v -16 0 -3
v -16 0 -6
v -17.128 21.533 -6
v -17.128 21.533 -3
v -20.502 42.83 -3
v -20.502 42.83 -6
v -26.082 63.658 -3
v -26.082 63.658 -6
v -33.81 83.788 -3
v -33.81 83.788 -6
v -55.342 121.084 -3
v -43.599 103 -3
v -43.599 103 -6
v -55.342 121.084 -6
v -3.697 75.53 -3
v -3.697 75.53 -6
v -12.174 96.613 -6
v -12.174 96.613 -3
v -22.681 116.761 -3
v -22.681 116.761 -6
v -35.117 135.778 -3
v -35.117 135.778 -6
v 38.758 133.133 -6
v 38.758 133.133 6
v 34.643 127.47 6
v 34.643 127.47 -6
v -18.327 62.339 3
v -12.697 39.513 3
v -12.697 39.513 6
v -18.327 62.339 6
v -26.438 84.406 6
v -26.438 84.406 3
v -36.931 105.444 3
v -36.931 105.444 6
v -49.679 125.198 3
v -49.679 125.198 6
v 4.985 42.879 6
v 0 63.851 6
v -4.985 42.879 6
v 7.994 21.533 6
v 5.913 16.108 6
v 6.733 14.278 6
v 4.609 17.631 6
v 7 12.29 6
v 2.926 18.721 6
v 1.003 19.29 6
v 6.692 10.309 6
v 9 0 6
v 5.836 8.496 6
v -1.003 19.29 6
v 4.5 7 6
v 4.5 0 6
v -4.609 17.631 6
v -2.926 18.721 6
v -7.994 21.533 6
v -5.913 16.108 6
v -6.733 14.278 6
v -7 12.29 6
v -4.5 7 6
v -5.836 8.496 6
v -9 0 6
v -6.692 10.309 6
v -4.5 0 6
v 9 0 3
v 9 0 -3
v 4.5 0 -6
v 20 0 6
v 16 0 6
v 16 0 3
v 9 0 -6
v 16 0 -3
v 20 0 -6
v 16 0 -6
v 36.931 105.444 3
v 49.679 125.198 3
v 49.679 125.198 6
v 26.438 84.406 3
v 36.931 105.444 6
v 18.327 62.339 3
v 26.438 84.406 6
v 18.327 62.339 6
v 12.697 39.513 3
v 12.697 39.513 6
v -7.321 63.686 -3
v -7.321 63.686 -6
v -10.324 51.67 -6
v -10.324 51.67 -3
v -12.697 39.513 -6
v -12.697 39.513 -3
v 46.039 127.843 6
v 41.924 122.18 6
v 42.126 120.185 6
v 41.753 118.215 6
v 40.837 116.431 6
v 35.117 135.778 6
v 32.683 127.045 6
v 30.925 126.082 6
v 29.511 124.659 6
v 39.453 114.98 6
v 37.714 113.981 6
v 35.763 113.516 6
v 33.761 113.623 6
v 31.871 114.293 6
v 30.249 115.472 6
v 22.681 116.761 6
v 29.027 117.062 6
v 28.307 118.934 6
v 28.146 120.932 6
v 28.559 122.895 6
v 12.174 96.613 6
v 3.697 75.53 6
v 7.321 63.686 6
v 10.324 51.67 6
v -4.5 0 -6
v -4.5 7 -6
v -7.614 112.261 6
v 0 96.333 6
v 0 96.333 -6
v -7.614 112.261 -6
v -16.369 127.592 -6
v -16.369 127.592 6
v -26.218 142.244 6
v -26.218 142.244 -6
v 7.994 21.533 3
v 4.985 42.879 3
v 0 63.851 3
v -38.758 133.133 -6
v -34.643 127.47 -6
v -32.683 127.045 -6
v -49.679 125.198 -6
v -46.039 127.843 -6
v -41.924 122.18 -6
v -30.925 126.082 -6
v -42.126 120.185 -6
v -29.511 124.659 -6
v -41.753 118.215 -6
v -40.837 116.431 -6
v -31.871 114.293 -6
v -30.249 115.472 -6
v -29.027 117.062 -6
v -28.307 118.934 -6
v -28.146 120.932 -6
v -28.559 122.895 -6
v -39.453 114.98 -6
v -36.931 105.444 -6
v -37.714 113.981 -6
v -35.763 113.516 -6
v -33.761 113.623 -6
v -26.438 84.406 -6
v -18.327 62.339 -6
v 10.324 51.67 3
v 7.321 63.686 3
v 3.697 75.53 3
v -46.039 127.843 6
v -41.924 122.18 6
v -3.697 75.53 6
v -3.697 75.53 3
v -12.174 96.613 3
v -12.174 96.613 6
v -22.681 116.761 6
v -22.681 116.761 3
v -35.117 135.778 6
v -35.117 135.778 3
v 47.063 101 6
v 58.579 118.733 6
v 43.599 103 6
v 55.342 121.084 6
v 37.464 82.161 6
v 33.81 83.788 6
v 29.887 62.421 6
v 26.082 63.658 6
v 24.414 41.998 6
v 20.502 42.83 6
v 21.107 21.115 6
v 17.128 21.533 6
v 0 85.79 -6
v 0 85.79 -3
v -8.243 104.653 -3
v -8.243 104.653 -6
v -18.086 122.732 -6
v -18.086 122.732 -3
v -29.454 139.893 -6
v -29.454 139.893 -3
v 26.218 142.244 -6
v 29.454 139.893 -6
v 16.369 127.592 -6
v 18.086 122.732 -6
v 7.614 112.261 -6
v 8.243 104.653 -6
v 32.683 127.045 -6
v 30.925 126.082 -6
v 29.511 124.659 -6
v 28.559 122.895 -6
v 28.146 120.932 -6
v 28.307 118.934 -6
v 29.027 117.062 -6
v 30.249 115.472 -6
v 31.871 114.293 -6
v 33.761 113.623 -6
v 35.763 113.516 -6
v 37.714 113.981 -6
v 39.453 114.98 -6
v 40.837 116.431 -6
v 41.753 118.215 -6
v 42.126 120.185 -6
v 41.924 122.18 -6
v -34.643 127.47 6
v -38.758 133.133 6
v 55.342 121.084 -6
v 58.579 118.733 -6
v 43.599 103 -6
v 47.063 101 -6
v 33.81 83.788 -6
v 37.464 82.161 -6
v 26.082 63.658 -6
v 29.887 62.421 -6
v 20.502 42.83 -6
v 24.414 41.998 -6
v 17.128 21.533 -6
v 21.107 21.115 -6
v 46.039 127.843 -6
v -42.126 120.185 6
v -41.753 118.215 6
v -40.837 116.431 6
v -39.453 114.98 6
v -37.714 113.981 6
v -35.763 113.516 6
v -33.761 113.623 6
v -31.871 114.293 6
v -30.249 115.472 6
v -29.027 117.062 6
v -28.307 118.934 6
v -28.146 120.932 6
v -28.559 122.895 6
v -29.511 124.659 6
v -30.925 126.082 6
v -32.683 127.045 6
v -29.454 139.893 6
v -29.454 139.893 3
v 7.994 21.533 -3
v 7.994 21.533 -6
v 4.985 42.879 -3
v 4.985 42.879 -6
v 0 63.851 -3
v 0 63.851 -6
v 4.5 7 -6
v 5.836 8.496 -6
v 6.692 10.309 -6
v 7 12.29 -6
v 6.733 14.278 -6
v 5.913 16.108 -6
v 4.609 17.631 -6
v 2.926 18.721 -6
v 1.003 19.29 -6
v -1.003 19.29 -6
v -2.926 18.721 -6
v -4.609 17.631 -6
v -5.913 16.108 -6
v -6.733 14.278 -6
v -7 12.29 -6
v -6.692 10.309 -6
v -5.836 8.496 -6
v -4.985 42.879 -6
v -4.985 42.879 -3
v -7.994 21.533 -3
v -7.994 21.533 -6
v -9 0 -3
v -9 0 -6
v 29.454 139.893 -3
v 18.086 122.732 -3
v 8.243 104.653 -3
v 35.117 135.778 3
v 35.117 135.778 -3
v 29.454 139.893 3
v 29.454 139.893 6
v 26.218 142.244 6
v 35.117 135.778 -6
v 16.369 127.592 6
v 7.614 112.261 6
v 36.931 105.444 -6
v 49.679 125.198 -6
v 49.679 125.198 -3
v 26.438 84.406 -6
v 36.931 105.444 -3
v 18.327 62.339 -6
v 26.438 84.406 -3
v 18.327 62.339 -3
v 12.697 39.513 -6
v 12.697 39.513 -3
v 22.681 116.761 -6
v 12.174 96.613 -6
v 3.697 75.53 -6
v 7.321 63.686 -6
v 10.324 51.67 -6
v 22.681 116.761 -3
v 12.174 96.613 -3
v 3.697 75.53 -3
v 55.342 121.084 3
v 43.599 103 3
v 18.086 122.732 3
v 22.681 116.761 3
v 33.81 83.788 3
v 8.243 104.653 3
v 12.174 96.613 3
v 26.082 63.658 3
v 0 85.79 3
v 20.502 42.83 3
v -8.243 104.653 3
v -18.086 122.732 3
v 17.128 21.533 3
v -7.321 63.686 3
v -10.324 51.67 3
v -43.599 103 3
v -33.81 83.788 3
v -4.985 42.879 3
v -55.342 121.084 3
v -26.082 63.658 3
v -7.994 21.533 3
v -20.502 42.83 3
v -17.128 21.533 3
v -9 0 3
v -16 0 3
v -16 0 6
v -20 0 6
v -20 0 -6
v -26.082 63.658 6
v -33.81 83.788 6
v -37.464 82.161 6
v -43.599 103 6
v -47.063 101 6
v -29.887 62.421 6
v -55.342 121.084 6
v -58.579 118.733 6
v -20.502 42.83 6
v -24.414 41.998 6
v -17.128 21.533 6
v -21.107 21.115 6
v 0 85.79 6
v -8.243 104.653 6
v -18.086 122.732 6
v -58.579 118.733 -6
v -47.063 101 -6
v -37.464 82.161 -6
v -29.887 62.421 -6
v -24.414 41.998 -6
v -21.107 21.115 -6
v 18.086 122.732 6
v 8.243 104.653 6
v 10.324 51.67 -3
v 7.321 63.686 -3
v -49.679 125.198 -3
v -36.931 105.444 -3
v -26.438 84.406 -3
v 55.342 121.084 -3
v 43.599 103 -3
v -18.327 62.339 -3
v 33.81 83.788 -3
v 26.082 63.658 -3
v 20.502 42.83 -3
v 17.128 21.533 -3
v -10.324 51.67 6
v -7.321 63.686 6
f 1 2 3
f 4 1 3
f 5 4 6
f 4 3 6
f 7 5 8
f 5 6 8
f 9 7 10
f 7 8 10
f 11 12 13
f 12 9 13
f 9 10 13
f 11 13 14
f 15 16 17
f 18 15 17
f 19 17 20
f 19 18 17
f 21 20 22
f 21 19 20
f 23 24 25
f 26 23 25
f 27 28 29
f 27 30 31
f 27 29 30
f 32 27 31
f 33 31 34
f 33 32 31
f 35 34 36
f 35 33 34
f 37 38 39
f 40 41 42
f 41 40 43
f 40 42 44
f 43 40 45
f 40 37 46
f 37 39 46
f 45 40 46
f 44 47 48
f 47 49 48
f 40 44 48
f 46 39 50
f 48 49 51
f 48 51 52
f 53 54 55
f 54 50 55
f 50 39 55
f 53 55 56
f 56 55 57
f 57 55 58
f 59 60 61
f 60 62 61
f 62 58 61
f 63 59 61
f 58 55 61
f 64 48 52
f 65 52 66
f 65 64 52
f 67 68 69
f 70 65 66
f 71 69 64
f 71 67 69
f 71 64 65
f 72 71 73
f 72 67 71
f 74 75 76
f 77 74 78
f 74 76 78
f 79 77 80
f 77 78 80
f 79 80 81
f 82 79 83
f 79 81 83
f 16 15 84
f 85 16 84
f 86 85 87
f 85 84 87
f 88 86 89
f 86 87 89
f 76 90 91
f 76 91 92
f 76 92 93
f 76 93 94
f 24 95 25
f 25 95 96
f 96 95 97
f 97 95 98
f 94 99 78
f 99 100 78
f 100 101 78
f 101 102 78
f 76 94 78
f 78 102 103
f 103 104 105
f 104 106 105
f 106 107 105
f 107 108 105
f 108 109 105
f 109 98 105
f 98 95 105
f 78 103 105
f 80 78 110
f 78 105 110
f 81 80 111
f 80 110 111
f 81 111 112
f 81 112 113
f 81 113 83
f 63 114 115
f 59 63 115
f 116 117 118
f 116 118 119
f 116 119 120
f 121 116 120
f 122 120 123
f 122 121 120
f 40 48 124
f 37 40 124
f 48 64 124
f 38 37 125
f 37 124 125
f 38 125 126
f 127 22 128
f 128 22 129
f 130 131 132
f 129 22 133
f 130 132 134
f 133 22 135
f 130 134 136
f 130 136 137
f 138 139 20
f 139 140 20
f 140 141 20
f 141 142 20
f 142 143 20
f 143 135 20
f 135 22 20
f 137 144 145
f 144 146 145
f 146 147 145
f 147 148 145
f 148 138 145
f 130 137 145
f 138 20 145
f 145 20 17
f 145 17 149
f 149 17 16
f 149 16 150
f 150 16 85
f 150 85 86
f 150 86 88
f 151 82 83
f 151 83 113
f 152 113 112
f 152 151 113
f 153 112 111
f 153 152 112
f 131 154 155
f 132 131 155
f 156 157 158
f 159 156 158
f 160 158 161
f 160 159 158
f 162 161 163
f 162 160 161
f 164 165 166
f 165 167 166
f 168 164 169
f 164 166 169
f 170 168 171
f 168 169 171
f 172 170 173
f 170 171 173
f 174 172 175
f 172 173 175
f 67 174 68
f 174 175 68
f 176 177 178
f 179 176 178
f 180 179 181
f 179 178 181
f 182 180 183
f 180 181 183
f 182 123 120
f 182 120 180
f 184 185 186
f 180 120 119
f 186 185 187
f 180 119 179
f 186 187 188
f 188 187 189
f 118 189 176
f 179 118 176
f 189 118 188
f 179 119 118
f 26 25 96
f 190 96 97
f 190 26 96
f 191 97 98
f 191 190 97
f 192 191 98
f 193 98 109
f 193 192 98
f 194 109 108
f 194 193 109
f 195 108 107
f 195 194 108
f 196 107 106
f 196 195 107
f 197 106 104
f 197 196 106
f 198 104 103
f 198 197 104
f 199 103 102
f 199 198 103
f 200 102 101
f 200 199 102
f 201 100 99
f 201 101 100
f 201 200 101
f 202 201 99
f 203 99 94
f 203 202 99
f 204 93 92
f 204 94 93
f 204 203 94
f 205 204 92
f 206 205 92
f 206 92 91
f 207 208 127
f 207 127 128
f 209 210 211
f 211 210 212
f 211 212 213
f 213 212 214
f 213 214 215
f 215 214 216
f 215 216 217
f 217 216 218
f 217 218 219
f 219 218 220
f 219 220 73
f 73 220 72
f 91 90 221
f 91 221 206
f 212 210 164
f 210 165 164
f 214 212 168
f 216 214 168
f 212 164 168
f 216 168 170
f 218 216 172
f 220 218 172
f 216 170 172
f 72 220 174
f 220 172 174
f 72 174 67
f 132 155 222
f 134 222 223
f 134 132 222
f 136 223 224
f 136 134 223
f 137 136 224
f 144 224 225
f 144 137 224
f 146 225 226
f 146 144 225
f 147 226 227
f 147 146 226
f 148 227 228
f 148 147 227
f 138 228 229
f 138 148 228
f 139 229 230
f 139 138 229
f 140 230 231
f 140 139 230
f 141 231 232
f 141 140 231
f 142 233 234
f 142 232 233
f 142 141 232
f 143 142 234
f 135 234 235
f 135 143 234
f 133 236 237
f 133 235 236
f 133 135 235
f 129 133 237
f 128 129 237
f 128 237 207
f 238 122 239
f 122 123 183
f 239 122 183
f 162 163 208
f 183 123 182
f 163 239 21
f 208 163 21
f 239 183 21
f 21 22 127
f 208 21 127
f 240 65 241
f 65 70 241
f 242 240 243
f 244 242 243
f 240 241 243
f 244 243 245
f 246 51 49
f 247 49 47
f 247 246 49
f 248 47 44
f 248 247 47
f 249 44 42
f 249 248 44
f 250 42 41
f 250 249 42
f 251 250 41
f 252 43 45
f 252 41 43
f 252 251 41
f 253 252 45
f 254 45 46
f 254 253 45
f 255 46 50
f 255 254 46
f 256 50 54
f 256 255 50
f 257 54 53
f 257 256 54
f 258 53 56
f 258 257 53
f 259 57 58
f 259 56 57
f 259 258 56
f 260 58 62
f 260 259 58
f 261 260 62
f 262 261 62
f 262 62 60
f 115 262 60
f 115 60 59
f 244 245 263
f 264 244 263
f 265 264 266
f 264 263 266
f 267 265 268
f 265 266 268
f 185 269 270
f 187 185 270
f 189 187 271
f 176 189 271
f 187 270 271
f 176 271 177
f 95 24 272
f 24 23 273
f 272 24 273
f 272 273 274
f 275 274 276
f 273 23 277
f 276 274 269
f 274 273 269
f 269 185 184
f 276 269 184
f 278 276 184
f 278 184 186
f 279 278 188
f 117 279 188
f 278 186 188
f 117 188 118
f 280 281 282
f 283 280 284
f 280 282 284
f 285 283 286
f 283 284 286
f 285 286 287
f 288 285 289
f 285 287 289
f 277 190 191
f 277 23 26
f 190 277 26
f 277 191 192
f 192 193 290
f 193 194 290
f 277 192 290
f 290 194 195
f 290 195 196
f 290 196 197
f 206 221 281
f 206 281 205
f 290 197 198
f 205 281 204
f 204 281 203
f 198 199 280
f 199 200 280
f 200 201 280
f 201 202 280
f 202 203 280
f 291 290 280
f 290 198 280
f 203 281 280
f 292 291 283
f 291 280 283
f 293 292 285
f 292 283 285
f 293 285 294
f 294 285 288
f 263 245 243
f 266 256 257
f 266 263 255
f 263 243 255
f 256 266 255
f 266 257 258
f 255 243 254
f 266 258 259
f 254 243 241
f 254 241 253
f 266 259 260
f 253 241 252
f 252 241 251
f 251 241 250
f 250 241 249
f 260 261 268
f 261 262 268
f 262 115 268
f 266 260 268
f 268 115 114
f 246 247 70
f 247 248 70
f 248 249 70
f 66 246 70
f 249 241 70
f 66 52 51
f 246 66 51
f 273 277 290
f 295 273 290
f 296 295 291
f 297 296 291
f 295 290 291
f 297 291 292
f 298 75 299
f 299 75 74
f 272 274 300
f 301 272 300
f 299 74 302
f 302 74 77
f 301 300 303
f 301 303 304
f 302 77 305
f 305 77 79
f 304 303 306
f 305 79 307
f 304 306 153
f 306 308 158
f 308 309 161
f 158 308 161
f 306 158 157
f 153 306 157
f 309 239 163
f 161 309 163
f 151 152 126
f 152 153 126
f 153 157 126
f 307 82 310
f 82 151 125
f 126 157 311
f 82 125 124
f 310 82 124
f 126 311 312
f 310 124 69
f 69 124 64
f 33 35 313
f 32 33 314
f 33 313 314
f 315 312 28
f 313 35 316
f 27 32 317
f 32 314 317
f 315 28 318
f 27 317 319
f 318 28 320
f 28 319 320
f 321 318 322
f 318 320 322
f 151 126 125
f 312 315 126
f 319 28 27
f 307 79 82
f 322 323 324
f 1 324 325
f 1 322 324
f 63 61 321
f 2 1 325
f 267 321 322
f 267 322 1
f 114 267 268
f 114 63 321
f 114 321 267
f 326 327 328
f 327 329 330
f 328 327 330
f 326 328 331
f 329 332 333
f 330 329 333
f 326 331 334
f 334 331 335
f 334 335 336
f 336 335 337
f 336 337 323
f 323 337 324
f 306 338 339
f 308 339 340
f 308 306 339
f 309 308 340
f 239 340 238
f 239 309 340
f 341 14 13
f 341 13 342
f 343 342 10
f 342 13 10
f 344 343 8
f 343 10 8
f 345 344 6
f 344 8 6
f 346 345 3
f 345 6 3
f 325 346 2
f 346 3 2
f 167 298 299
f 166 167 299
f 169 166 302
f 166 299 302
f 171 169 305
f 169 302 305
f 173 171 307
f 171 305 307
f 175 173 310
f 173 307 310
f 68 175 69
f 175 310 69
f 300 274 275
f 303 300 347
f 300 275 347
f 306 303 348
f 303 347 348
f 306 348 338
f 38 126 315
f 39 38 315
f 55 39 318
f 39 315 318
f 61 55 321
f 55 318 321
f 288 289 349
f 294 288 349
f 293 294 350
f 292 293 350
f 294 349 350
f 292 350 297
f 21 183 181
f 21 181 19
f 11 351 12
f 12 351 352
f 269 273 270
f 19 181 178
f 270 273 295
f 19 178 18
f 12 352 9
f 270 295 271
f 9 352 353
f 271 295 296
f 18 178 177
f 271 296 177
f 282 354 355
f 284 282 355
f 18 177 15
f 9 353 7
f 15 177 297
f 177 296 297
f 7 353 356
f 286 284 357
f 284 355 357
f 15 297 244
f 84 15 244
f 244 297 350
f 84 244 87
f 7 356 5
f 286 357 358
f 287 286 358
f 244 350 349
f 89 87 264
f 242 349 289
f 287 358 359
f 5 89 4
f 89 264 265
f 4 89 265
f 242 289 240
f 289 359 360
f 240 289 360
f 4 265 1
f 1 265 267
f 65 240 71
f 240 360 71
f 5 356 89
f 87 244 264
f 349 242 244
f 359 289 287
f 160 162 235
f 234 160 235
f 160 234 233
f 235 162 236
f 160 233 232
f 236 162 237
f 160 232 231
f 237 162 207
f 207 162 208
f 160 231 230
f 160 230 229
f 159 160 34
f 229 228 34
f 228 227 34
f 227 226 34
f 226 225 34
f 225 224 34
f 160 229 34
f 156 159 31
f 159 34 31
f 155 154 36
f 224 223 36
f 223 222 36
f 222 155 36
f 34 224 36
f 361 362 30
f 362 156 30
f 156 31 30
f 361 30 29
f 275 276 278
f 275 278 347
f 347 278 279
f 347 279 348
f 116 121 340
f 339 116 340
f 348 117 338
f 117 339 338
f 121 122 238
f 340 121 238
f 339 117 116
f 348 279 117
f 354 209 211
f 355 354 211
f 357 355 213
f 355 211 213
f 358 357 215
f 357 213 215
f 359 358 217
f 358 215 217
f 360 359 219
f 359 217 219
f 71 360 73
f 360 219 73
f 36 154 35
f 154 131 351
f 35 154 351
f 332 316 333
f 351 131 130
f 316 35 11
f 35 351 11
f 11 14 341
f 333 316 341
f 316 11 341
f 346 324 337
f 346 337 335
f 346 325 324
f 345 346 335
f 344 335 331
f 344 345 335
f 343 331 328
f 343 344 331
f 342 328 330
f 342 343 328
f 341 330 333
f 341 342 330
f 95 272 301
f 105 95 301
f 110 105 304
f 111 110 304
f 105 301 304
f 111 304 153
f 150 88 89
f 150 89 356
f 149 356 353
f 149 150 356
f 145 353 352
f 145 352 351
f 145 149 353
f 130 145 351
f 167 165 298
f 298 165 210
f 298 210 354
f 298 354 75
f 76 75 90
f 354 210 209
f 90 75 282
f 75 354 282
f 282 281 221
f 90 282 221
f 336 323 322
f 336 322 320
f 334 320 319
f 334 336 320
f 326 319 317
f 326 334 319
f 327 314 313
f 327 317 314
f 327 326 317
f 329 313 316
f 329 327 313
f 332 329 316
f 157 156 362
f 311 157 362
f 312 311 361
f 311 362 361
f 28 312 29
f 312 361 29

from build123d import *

# Parameters (mm, degrees)
SKETCH003_W          = 7
SKETCH003_H          = 3
SKETCH004_W          = 7
SKETCH004_H          = 3
SKETCH005_W          = 7
SKETCH005_H          = 3
SKETCH006_W          = 7
SKETCH006_H          = 3
POCKET_DEPTH         = 6.001
POCKET_DEPTH_BACK    = -6.001
POCKET001_DEPTH      = 6.001
POCKET001_DEPTH_BACK = -6.001
POCKET002_DEPTH      = 6.001
POCKET002_DEPTH_BACK = -6.001


with BuildPart() as part:
    # AdditivePipe: sweep along a path in Sketch
    with BuildLine(Plane.XY) as additivepipe_path:
        ThreePointArc((0, 0), (-10.865453, 68.601773), (-42.398227, 130.488326))
    # Sketch002 → AdditivePipe (sweep)
    with BuildSketch(Plane.XZ):
        Polygon((-20, 6), (-20, -6), (-16, -6), (-16, -3), (-9, -3), (-9, -6), (9, -6), (9, -3), (16, -3), (16, -6), (20, -6), (20, 6), (16, 6), (16, 3), (9, 3), (9, 6), (-9, 6), (-9, 3), (-16, 3), (-16, 6), align=None)
    sweep(path=additivepipe_path.line)

    # AdditivePipe001: sweep along a path in Sketch001
    with BuildLine(Plane.XY) as additivepipe001_path:
        ThreePointArc((42.398227, 130.488326), (10.865453, 68.601773), (0, 0))
    # Sketch002 → AdditivePipe001 (sweep)
    with BuildSketch(Plane.XZ):
        Polygon((-20, 6), (-20, -6), (-16, -6), (-16, -3), (-9, -3), (-9, -6), (9, -6), (9, -3), (16, -3), (16, -6), (20, -6), (20, 6), (16, 6), (16, 3), (9, 3), (9, 6), (-9, 6), (-9, 3), (-16, 3), (-16, 6), align=None)
    sweep(path=additivepipe001_path.line)

    # SubtractivePipe: sweep along a path in Sketch
    with BuildLine(Plane.XY) as subtractivepipe_path:
        ThreePointArc((0, 0), (-10.865453, 68.601773), (-42.398227, 130.488326))
    # Sketch003 → SubtractivePipe (sweep, cut)
    with BuildSketch(Plane.XZ):
        with Locations((-12.5, 4.5)):
            Rectangle(SKETCH003_W, SKETCH003_H)
    sweep(path=subtractivepipe_path.line, mode=Mode.SUBTRACT)

    # SubtractivePipe001: sweep along a path in Sketch001
    with BuildLine(Plane.XY) as subtractivepipe001_path:
        ThreePointArc((42.398227, 130.488326), (10.865453, 68.601773), (0, 0))
    # Sketch003 → SubtractivePipe001 (sweep, cut)
    with BuildSketch(Plane.XZ):
        with Locations((-12.5, 4.5)):
            Rectangle(SKETCH003_W, SKETCH003_H)
    sweep(path=subtractivepipe001_path.line, mode=Mode.SUBTRACT)

    # SubtractivePipe002: sweep along a path in Sketch
    with BuildLine(Plane.XY) as subtractivepipe002_path:
        ThreePointArc((0, 0), (-10.865453, 68.601773), (-42.398227, 130.488326))
    # Sketch004 → SubtractivePipe002 (sweep, cut)
    with BuildSketch(Plane.XZ):
        with Locations((12.5, 4.5)):
            Rectangle(SKETCH004_W, SKETCH004_H)
    sweep(path=subtractivepipe002_path.line, mode=Mode.SUBTRACT)

    # SubtractivePipe003: sweep along a path in Sketch001
    with BuildLine(Plane.XY) as subtractivepipe003_path:
        ThreePointArc((42.398227, 130.488326), (10.865453, 68.601773), (0, 0))
    # Sketch004 → SubtractivePipe003 (sweep, cut)
    with BuildSketch(Plane.XZ):
        with Locations((12.5, 4.5)):
            Rectangle(SKETCH004_W, SKETCH004_H)
    sweep(path=subtractivepipe003_path.line, mode=Mode.SUBTRACT)

    # SubtractivePipe004: sweep along a path in Sketch
    with BuildLine(Plane.XY) as subtractivepipe004_path:
        ThreePointArc((0, 0), (-10.865453, 68.601773), (-42.398227, 130.488326))
    # Sketch005 → SubtractivePipe004 (sweep, cut)
    with BuildSketch(Plane.XZ):
        with Locations((-12.5, -4.5)):
            Rectangle(SKETCH005_W, SKETCH005_H)
    sweep(path=subtractivepipe004_path.line, mode=Mode.SUBTRACT)

    # SubtractivePipe005: sweep along a path in Sketch001
    with BuildLine(Plane.XY) as subtractivepipe005_path:
        ThreePointArc((42.398227, 130.488326), (10.865453, 68.601773), (0, 0))
    # Sketch005 → SubtractivePipe005 (sweep, cut)
    with BuildSketch(Plane.XZ):
        with Locations((-12.5, -4.5)):
            Rectangle(SKETCH005_W, SKETCH005_H)
    sweep(path=subtractivepipe005_path.line, mode=Mode.SUBTRACT)

    # SubtractivePipe006: sweep along a path in Sketch
    with BuildLine(Plane.XY) as subtractivepipe006_path:
        ThreePointArc((0, 0), (-10.865453, 68.601773), (-42.398227, 130.488326))
    # Sketch006 → SubtractivePipe006 (sweep, cut)
    with BuildSketch(Plane.XZ):
        with Locations((12.5, -4.5)):
            Rectangle(SKETCH006_W, SKETCH006_H)
    sweep(path=subtractivepipe006_path.line, mode=Mode.SUBTRACT)

    # SubtractivePipe007: sweep along a path in Sketch001
    with BuildLine(Plane.XY) as subtractivepipe007_path:
        ThreePointArc((42.398227, 130.488326), (10.865453, 68.601773), (0, 0))
    # Sketch006 → SubtractivePipe007 (sweep, cut)
    with BuildSketch(Plane.XZ):
        with Locations((12.5, -4.5)):
            Rectangle(SKETCH006_W, SKETCH006_H)
    sweep(path=subtractivepipe007_path.line, mode=Mode.SUBTRACT)

    # Sketch007 → Pocket (cut, two sides)
    with BuildSketch(Plane.XY) as pocket_sk:
        with BuildLine():
            Line((-4.5, 0), (4.5, 0))
            Line((4.5, 0), (4.5, 7))
            ThreePointArc((4.5, 7), (0, 19.361903), (-4.5, 7))
            Line((-4.5, 0), (-4.5, 7))
        make_face()
    extrude(amount=-POCKET_DEPTH, mode=Mode.SUBTRACT)
    extrude(pocket_sk.sketch, amount=-POCKET_DEPTH_BACK, mode=Mode.SUBTRACT)

    # Sketch008 → Pocket001 (cut, two sides)
    with BuildSketch(Plane.XY) as pocket001_sk:
        with BuildLine():
            Line((-46.038804, 127.843292), (-38.757651, 133.13336))
            Line((-38.757651, 133.13336), (-34.643154, 127.470241))
            ThreePointArc((-41.924307, 122.180173), (-31.017586, 114.824218), (-34.643154, 127.470241))
            Line((-46.038804, 127.843292), (-41.924307, 122.180173))
        make_face()
    extrude(amount=-POCKET001_DEPTH, mode=Mode.SUBTRACT)
    extrude(pocket001_sk.sketch, amount=-POCKET001_DEPTH_BACK, mode=Mode.SUBTRACT)

    # Sketch009 → Pocket002 (cut, two sides)
    with BuildSketch(Plane.XY) as pocket002_sk:
        with BuildLine():
            Line((38.757651, 133.13336), (46.038804, 127.843292))
            Line((46.038804, 127.843292), (41.924307, 122.180173))
            ThreePointArc((34.643154, 127.470241), (31.017586, 114.824218), (41.924307, 122.180173))
            Line((38.757651, 133.13336), (34.643154, 127.470241))
        make_face()
    extrude(amount=-POCKET002_DEPTH, mode=Mode.SUBTRACT)
    extrude(pocket002_sk.sketch, amount=-POCKET002_DEPTH_BACK, mode=Mode.SUBTRACT)


solid = part.part
